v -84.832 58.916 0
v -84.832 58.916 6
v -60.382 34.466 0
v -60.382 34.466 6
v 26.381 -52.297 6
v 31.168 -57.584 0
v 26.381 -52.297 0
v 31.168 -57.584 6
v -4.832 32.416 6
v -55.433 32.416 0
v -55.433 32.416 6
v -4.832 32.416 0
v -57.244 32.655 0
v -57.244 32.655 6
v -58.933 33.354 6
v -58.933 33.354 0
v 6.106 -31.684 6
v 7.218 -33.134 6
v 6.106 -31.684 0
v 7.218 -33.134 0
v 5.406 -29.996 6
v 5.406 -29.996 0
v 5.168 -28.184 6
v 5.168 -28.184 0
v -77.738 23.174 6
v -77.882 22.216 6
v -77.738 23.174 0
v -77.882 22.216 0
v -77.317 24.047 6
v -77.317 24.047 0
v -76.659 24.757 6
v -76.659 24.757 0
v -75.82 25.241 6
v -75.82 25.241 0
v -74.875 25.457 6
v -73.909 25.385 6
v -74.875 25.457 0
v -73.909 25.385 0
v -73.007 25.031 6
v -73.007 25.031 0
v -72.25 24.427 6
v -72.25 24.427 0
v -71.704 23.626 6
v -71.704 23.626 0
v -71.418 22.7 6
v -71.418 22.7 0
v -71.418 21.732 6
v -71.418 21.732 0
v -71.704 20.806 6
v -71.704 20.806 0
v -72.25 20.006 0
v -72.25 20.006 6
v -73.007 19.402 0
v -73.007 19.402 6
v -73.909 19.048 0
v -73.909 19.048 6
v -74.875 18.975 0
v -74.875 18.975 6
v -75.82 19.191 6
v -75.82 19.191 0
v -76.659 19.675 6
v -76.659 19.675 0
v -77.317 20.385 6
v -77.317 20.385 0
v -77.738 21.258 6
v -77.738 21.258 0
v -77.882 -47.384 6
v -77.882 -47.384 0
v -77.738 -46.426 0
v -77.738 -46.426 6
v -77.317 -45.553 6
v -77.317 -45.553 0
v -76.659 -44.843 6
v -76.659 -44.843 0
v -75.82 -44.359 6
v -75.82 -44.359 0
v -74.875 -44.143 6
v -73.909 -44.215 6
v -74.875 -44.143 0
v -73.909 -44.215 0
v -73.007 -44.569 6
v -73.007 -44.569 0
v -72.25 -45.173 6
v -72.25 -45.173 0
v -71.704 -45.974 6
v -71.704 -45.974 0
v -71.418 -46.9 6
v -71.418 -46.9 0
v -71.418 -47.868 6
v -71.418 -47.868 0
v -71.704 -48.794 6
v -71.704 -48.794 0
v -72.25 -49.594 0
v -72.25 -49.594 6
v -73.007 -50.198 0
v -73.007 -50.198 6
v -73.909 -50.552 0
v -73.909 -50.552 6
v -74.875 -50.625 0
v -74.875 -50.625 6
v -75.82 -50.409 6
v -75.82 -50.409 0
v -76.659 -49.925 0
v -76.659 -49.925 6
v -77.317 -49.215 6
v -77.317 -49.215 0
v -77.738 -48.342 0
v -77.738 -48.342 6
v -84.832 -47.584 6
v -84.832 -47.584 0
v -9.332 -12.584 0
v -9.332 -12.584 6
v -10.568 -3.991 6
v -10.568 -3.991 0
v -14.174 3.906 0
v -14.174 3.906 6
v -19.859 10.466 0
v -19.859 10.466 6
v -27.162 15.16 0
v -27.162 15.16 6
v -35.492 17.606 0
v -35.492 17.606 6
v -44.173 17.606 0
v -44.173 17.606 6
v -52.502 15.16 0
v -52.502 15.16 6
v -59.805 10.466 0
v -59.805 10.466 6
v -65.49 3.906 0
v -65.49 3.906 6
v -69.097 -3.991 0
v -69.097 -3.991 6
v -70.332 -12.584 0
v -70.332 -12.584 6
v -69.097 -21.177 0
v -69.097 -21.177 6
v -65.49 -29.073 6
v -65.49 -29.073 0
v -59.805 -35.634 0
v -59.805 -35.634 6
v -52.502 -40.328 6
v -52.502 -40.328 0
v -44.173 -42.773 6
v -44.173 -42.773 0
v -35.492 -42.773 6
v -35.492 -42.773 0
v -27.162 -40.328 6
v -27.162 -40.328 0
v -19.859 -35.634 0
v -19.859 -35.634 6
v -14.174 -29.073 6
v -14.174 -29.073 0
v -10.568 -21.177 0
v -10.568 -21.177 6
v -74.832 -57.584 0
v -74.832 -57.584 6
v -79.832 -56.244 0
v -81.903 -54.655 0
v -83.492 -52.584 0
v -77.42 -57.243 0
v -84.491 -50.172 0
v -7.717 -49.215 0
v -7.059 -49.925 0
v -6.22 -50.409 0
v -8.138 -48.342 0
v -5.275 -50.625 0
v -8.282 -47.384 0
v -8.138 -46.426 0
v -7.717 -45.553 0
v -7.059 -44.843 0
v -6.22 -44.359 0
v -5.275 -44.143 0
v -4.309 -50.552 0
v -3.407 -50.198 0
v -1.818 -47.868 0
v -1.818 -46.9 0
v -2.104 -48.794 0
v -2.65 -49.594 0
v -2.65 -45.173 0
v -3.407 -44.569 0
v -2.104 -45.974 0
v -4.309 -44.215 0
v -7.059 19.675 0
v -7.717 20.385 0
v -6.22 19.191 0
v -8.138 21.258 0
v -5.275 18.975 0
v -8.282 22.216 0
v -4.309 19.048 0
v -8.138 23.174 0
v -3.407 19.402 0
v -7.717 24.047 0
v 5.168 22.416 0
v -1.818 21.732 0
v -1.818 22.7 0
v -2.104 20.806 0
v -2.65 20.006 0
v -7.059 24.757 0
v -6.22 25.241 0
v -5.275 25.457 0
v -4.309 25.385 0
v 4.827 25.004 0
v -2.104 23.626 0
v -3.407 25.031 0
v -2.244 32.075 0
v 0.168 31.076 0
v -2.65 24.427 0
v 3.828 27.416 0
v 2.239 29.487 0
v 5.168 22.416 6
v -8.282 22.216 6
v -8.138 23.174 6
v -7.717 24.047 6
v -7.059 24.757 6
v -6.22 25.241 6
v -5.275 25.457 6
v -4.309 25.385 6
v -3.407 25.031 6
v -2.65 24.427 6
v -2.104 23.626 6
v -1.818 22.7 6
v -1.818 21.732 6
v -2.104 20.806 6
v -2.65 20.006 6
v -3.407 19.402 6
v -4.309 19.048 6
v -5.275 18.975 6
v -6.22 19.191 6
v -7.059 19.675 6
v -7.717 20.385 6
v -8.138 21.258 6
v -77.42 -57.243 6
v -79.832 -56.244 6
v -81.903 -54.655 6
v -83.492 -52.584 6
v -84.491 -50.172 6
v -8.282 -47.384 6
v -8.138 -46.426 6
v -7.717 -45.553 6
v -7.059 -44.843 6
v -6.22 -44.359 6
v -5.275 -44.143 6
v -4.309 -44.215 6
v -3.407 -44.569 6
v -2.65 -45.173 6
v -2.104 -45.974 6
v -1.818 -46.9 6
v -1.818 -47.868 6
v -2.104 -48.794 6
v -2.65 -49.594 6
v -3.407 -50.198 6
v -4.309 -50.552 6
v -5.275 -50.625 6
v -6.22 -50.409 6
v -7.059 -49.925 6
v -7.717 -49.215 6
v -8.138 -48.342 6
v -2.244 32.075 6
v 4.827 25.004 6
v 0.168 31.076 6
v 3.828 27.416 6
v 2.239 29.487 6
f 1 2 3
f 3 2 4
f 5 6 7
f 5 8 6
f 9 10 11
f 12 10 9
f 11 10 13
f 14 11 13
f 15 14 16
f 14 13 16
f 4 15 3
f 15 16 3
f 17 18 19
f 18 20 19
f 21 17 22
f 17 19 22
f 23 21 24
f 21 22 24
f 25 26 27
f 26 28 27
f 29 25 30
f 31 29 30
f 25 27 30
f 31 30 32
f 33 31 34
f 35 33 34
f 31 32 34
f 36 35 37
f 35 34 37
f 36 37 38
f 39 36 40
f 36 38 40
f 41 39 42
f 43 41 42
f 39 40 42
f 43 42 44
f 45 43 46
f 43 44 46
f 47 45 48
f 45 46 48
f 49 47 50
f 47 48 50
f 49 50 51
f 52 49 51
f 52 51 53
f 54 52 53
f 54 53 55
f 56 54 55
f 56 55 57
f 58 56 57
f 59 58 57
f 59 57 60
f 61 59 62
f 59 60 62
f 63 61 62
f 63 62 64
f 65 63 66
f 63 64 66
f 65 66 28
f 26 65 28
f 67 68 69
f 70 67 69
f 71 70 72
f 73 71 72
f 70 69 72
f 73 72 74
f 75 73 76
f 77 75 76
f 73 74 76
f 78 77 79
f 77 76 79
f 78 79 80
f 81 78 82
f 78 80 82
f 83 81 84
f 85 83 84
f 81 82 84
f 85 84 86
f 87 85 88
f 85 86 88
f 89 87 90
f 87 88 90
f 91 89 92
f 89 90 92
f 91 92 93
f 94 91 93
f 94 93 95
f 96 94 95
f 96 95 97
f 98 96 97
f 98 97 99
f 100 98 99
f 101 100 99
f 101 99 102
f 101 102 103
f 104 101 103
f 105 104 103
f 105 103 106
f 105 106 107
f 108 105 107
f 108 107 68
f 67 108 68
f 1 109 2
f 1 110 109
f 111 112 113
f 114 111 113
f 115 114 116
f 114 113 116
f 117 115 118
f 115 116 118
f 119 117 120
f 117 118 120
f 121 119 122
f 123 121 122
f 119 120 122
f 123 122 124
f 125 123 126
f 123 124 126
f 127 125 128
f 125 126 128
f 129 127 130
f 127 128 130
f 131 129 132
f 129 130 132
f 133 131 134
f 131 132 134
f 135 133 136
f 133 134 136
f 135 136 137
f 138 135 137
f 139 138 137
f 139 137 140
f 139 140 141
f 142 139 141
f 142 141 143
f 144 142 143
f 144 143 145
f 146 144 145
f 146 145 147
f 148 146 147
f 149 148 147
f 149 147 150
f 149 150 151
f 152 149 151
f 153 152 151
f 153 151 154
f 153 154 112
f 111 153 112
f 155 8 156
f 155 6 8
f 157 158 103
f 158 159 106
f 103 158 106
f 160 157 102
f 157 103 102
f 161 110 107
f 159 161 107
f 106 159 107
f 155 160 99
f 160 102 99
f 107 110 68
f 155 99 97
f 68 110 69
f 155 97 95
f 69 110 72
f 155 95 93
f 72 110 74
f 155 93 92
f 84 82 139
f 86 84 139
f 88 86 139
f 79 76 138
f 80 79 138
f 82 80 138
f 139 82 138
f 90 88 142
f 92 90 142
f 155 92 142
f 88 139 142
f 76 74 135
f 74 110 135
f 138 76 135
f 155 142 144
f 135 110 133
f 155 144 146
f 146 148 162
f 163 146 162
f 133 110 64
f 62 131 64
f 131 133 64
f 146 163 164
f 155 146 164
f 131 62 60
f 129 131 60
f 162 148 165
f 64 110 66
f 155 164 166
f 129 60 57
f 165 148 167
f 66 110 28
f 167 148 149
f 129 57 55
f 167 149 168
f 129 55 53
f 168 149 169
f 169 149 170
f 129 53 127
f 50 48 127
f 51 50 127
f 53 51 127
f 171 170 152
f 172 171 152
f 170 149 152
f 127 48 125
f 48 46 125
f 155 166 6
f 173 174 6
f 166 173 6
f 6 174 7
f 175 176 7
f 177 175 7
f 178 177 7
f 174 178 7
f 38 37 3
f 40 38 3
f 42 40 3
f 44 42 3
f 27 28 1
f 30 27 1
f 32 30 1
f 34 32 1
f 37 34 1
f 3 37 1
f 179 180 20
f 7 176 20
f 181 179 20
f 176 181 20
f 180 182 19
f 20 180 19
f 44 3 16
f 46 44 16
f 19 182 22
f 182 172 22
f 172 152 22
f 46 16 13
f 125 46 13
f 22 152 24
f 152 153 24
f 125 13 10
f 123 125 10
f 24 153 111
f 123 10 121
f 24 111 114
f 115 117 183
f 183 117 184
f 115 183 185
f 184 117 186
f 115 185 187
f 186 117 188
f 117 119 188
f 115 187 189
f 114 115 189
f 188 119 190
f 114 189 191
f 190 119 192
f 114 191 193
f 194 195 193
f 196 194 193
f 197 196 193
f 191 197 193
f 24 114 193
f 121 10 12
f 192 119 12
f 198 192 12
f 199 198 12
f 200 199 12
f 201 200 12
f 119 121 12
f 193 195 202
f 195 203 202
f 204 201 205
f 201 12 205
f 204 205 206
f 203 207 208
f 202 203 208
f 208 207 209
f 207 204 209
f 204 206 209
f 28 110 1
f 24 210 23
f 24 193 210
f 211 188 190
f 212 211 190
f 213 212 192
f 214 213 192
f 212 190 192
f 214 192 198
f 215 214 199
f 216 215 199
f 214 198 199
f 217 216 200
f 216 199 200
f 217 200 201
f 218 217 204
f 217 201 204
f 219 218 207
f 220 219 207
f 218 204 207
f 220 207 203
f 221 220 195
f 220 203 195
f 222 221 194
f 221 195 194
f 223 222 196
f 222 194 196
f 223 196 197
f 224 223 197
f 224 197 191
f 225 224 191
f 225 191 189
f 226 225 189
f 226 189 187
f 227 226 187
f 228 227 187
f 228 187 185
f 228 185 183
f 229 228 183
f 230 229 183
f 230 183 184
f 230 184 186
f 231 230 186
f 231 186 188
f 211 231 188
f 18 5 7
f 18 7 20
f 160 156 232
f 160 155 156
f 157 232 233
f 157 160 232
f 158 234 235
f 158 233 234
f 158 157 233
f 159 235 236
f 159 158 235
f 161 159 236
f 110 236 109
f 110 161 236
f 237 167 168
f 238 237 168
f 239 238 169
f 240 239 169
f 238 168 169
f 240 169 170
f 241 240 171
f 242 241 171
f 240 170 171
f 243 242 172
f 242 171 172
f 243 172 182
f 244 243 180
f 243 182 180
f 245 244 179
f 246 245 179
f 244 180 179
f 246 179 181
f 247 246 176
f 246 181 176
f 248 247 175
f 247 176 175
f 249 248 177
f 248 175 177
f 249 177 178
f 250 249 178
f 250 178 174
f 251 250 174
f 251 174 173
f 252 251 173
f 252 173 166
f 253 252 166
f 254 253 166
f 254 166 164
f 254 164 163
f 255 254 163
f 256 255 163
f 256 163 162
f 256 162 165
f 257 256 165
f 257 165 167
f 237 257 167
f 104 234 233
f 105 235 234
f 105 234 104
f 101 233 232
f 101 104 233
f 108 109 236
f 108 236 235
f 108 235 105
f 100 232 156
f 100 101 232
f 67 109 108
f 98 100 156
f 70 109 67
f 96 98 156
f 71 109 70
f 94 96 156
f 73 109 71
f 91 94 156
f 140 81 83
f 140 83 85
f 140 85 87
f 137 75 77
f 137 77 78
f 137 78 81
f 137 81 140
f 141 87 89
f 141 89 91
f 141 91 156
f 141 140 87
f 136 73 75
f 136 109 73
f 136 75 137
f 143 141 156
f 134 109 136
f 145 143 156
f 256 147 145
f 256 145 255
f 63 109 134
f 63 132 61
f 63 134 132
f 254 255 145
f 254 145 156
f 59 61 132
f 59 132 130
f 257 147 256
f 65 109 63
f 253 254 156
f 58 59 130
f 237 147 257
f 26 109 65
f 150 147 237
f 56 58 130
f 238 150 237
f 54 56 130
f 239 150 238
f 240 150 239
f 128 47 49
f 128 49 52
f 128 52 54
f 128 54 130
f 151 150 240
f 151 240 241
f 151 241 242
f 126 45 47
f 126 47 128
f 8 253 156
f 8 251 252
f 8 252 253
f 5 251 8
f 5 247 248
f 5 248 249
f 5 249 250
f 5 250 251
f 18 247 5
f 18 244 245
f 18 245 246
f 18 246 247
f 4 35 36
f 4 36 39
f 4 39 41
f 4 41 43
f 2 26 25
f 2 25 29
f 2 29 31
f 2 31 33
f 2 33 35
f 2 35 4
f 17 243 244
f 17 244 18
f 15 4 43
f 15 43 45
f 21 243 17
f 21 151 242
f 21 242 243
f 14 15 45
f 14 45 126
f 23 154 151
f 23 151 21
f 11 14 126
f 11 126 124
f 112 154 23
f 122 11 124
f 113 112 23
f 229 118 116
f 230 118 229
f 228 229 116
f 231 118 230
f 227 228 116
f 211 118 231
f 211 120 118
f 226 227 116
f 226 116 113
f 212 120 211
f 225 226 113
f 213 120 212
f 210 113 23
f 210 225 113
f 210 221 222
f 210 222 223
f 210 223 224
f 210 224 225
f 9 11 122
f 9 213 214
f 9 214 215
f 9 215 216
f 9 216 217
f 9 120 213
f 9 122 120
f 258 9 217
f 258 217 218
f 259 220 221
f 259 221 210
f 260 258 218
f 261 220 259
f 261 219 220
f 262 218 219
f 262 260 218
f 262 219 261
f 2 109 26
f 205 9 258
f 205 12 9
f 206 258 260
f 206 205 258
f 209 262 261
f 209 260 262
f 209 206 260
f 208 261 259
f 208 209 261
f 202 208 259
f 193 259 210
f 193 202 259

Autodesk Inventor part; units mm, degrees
ref_plane "YZ Plane" through (0, 0, 0) normal (1, 0, 0) x (0, 1, 0)
ref_plane "XZ Plane" through (0, 0, 0) normal (0, 1, 0) x (-1, 0, 0)
ref_plane "XY Plane" through (0, 0, 0) normal (0, 0, 1) x (1, 0, 0)
sketch "Sketch1" plane through (0, 0, 0) normal (0, 0, 1) x (1, 0, 0)
  line L0 (-74.8322, 32.4161) -> (-4.8322, 32.4161)
  line L1 (5.1678, 22.4161) -> (5.1678, -47.5839)
  line L2 (-4.8322, -57.5839) -> (-74.8322, -57.5839)
  line L3 (-84.8322, -47.5839) -> (-84.8322, 22.4161)
  arc A0 (-74.8322, 32.4161) -> (-84.8322, 22.4161) centre (-74.8322, 22.4161) ccw
  arc A1 (5.1678, 22.4161) -> (-4.8322, 32.4161) centre (-4.8322, 22.4161) ccw
  arc A2 (-4.8322, -57.5839) -> (5.1678, -47.5839) centre (-4.8322, -47.5839) ccw
  arc A3 (-84.8322, -47.5839) -> (-74.8322, -57.5839) centre (-74.8322, -47.5839) ccw
  point P0 (0, 0)
  point P1 (-84.8322, 32.4161)
  point P2 (5.1678, 32.4161)
  point P3 (-84.8322, -57.5839)
  dimension "d0" = 90
  dimension "d1" = 90
  dimension "d2" = 10
extrude "Extrusion1" add sketch "Sketch1" along normal blind 6
sketch "Sketch2" plane through (0, 0, 6) normal (0, 0, 1) x (1, 0, 0)
  line L0 (-84.8322, -47.5839) -> (-84.8322, 22.4161) projected
  line L1 (-84.8322, -12.5839) -> (5.1678, -12.5839) construction
  line L2 (5.1678, 22.4161) -> (5.1678, -47.5839) projected
  circle A0 centre (-39.8322, -12.5839) radius 30.5
  point P0 (0, 0)
  dimension "d5" = 61
extrude "Extrusion2" cut sketch "Sketch2" against normal through all
sketch "Sketch3" plane through (0, 0, 6) normal (0, 0, 1) x (1, 0, 0)
  line L0 (5.1678, -47.5839) -> (5.1678, 22.4161) projected
  line L1 (5.1678, -12.5839) -> (30.1678, -12.5839) construction
  line L2 (26.381, -52.2971) -> (5.1678, -31.0839)
  circle A0 centre (-39.8322, -12.5839) radius 30.5 projected
  line L3 (-39.8322, -12.5839) -> (-18.2655, 8.9829) construction
  line L4 (-79.5454, 53.6293) -> (-58.3322, 32.4161)
  line L5 (-74.8322, -57.5839) -> (-4.8322, -57.5839) projected
  line L6 (-4.8322, -57.5839) -> (31.1678, -57.5839)
  line L7 (31.1678, -57.5839) -> (26.381, -52.2971)
  arc A1 (-74.8322, 32.4161) -> (-84.8322, 22.4161) centre (-74.8322, 22.4161) ccw projected
  line L8 (-84.8322, 22.4161) -> (-84.8322, 58.9161)
  line L9 (-84.8322, 58.9161) -> (-79.5454, 53.6293)
  line L10 (-4.8322, 32.4161) -> (-74.8322, 32.4161) projected
  line L11 (-58.3322, 32.4161) -> (-74.8322, 32.4161)
  arc A2 (-4.8322, -57.5839) -> (5.1678, -47.5839) centre (-4.8322, -47.5839) ccw projected
  line L12 (5.1678, -31.0839) -> (5.1678, -47.5839)
  point P0 (0, 0)
  dimension "d13" = 53.5
extrude "Extrusion3" add sketch "Sketch3" against normal up to surface (6 mm away) contours L0 L2 L7 L6 A2 | L4 L10 A1 L8 L9
fillet "Fillet1" radius 7 2 edges at (-58.3322, 32.4161, 3) (5.1678, -31.0839, 3)
sketch "Sketch4" plane through (0, 0, 0) normal (0, 0, -1) x (-1, 0, 0)
  circle A0 centre (74.6322, 22.2161) radius 3.25 projected
  circle A1 centre (74.6322, -47.3839) radius 3.25 projected
  circle A2 centre (5.0322, -47.3839) radius 3.25 projected
  circle A3 centre (5.0322, 22.2161) radius 3.25 projected
  point P0 (0, 0)
extrude "Extrusion4" cut sketch "Sketch4" against normal through all
properties part number "Motor support"
